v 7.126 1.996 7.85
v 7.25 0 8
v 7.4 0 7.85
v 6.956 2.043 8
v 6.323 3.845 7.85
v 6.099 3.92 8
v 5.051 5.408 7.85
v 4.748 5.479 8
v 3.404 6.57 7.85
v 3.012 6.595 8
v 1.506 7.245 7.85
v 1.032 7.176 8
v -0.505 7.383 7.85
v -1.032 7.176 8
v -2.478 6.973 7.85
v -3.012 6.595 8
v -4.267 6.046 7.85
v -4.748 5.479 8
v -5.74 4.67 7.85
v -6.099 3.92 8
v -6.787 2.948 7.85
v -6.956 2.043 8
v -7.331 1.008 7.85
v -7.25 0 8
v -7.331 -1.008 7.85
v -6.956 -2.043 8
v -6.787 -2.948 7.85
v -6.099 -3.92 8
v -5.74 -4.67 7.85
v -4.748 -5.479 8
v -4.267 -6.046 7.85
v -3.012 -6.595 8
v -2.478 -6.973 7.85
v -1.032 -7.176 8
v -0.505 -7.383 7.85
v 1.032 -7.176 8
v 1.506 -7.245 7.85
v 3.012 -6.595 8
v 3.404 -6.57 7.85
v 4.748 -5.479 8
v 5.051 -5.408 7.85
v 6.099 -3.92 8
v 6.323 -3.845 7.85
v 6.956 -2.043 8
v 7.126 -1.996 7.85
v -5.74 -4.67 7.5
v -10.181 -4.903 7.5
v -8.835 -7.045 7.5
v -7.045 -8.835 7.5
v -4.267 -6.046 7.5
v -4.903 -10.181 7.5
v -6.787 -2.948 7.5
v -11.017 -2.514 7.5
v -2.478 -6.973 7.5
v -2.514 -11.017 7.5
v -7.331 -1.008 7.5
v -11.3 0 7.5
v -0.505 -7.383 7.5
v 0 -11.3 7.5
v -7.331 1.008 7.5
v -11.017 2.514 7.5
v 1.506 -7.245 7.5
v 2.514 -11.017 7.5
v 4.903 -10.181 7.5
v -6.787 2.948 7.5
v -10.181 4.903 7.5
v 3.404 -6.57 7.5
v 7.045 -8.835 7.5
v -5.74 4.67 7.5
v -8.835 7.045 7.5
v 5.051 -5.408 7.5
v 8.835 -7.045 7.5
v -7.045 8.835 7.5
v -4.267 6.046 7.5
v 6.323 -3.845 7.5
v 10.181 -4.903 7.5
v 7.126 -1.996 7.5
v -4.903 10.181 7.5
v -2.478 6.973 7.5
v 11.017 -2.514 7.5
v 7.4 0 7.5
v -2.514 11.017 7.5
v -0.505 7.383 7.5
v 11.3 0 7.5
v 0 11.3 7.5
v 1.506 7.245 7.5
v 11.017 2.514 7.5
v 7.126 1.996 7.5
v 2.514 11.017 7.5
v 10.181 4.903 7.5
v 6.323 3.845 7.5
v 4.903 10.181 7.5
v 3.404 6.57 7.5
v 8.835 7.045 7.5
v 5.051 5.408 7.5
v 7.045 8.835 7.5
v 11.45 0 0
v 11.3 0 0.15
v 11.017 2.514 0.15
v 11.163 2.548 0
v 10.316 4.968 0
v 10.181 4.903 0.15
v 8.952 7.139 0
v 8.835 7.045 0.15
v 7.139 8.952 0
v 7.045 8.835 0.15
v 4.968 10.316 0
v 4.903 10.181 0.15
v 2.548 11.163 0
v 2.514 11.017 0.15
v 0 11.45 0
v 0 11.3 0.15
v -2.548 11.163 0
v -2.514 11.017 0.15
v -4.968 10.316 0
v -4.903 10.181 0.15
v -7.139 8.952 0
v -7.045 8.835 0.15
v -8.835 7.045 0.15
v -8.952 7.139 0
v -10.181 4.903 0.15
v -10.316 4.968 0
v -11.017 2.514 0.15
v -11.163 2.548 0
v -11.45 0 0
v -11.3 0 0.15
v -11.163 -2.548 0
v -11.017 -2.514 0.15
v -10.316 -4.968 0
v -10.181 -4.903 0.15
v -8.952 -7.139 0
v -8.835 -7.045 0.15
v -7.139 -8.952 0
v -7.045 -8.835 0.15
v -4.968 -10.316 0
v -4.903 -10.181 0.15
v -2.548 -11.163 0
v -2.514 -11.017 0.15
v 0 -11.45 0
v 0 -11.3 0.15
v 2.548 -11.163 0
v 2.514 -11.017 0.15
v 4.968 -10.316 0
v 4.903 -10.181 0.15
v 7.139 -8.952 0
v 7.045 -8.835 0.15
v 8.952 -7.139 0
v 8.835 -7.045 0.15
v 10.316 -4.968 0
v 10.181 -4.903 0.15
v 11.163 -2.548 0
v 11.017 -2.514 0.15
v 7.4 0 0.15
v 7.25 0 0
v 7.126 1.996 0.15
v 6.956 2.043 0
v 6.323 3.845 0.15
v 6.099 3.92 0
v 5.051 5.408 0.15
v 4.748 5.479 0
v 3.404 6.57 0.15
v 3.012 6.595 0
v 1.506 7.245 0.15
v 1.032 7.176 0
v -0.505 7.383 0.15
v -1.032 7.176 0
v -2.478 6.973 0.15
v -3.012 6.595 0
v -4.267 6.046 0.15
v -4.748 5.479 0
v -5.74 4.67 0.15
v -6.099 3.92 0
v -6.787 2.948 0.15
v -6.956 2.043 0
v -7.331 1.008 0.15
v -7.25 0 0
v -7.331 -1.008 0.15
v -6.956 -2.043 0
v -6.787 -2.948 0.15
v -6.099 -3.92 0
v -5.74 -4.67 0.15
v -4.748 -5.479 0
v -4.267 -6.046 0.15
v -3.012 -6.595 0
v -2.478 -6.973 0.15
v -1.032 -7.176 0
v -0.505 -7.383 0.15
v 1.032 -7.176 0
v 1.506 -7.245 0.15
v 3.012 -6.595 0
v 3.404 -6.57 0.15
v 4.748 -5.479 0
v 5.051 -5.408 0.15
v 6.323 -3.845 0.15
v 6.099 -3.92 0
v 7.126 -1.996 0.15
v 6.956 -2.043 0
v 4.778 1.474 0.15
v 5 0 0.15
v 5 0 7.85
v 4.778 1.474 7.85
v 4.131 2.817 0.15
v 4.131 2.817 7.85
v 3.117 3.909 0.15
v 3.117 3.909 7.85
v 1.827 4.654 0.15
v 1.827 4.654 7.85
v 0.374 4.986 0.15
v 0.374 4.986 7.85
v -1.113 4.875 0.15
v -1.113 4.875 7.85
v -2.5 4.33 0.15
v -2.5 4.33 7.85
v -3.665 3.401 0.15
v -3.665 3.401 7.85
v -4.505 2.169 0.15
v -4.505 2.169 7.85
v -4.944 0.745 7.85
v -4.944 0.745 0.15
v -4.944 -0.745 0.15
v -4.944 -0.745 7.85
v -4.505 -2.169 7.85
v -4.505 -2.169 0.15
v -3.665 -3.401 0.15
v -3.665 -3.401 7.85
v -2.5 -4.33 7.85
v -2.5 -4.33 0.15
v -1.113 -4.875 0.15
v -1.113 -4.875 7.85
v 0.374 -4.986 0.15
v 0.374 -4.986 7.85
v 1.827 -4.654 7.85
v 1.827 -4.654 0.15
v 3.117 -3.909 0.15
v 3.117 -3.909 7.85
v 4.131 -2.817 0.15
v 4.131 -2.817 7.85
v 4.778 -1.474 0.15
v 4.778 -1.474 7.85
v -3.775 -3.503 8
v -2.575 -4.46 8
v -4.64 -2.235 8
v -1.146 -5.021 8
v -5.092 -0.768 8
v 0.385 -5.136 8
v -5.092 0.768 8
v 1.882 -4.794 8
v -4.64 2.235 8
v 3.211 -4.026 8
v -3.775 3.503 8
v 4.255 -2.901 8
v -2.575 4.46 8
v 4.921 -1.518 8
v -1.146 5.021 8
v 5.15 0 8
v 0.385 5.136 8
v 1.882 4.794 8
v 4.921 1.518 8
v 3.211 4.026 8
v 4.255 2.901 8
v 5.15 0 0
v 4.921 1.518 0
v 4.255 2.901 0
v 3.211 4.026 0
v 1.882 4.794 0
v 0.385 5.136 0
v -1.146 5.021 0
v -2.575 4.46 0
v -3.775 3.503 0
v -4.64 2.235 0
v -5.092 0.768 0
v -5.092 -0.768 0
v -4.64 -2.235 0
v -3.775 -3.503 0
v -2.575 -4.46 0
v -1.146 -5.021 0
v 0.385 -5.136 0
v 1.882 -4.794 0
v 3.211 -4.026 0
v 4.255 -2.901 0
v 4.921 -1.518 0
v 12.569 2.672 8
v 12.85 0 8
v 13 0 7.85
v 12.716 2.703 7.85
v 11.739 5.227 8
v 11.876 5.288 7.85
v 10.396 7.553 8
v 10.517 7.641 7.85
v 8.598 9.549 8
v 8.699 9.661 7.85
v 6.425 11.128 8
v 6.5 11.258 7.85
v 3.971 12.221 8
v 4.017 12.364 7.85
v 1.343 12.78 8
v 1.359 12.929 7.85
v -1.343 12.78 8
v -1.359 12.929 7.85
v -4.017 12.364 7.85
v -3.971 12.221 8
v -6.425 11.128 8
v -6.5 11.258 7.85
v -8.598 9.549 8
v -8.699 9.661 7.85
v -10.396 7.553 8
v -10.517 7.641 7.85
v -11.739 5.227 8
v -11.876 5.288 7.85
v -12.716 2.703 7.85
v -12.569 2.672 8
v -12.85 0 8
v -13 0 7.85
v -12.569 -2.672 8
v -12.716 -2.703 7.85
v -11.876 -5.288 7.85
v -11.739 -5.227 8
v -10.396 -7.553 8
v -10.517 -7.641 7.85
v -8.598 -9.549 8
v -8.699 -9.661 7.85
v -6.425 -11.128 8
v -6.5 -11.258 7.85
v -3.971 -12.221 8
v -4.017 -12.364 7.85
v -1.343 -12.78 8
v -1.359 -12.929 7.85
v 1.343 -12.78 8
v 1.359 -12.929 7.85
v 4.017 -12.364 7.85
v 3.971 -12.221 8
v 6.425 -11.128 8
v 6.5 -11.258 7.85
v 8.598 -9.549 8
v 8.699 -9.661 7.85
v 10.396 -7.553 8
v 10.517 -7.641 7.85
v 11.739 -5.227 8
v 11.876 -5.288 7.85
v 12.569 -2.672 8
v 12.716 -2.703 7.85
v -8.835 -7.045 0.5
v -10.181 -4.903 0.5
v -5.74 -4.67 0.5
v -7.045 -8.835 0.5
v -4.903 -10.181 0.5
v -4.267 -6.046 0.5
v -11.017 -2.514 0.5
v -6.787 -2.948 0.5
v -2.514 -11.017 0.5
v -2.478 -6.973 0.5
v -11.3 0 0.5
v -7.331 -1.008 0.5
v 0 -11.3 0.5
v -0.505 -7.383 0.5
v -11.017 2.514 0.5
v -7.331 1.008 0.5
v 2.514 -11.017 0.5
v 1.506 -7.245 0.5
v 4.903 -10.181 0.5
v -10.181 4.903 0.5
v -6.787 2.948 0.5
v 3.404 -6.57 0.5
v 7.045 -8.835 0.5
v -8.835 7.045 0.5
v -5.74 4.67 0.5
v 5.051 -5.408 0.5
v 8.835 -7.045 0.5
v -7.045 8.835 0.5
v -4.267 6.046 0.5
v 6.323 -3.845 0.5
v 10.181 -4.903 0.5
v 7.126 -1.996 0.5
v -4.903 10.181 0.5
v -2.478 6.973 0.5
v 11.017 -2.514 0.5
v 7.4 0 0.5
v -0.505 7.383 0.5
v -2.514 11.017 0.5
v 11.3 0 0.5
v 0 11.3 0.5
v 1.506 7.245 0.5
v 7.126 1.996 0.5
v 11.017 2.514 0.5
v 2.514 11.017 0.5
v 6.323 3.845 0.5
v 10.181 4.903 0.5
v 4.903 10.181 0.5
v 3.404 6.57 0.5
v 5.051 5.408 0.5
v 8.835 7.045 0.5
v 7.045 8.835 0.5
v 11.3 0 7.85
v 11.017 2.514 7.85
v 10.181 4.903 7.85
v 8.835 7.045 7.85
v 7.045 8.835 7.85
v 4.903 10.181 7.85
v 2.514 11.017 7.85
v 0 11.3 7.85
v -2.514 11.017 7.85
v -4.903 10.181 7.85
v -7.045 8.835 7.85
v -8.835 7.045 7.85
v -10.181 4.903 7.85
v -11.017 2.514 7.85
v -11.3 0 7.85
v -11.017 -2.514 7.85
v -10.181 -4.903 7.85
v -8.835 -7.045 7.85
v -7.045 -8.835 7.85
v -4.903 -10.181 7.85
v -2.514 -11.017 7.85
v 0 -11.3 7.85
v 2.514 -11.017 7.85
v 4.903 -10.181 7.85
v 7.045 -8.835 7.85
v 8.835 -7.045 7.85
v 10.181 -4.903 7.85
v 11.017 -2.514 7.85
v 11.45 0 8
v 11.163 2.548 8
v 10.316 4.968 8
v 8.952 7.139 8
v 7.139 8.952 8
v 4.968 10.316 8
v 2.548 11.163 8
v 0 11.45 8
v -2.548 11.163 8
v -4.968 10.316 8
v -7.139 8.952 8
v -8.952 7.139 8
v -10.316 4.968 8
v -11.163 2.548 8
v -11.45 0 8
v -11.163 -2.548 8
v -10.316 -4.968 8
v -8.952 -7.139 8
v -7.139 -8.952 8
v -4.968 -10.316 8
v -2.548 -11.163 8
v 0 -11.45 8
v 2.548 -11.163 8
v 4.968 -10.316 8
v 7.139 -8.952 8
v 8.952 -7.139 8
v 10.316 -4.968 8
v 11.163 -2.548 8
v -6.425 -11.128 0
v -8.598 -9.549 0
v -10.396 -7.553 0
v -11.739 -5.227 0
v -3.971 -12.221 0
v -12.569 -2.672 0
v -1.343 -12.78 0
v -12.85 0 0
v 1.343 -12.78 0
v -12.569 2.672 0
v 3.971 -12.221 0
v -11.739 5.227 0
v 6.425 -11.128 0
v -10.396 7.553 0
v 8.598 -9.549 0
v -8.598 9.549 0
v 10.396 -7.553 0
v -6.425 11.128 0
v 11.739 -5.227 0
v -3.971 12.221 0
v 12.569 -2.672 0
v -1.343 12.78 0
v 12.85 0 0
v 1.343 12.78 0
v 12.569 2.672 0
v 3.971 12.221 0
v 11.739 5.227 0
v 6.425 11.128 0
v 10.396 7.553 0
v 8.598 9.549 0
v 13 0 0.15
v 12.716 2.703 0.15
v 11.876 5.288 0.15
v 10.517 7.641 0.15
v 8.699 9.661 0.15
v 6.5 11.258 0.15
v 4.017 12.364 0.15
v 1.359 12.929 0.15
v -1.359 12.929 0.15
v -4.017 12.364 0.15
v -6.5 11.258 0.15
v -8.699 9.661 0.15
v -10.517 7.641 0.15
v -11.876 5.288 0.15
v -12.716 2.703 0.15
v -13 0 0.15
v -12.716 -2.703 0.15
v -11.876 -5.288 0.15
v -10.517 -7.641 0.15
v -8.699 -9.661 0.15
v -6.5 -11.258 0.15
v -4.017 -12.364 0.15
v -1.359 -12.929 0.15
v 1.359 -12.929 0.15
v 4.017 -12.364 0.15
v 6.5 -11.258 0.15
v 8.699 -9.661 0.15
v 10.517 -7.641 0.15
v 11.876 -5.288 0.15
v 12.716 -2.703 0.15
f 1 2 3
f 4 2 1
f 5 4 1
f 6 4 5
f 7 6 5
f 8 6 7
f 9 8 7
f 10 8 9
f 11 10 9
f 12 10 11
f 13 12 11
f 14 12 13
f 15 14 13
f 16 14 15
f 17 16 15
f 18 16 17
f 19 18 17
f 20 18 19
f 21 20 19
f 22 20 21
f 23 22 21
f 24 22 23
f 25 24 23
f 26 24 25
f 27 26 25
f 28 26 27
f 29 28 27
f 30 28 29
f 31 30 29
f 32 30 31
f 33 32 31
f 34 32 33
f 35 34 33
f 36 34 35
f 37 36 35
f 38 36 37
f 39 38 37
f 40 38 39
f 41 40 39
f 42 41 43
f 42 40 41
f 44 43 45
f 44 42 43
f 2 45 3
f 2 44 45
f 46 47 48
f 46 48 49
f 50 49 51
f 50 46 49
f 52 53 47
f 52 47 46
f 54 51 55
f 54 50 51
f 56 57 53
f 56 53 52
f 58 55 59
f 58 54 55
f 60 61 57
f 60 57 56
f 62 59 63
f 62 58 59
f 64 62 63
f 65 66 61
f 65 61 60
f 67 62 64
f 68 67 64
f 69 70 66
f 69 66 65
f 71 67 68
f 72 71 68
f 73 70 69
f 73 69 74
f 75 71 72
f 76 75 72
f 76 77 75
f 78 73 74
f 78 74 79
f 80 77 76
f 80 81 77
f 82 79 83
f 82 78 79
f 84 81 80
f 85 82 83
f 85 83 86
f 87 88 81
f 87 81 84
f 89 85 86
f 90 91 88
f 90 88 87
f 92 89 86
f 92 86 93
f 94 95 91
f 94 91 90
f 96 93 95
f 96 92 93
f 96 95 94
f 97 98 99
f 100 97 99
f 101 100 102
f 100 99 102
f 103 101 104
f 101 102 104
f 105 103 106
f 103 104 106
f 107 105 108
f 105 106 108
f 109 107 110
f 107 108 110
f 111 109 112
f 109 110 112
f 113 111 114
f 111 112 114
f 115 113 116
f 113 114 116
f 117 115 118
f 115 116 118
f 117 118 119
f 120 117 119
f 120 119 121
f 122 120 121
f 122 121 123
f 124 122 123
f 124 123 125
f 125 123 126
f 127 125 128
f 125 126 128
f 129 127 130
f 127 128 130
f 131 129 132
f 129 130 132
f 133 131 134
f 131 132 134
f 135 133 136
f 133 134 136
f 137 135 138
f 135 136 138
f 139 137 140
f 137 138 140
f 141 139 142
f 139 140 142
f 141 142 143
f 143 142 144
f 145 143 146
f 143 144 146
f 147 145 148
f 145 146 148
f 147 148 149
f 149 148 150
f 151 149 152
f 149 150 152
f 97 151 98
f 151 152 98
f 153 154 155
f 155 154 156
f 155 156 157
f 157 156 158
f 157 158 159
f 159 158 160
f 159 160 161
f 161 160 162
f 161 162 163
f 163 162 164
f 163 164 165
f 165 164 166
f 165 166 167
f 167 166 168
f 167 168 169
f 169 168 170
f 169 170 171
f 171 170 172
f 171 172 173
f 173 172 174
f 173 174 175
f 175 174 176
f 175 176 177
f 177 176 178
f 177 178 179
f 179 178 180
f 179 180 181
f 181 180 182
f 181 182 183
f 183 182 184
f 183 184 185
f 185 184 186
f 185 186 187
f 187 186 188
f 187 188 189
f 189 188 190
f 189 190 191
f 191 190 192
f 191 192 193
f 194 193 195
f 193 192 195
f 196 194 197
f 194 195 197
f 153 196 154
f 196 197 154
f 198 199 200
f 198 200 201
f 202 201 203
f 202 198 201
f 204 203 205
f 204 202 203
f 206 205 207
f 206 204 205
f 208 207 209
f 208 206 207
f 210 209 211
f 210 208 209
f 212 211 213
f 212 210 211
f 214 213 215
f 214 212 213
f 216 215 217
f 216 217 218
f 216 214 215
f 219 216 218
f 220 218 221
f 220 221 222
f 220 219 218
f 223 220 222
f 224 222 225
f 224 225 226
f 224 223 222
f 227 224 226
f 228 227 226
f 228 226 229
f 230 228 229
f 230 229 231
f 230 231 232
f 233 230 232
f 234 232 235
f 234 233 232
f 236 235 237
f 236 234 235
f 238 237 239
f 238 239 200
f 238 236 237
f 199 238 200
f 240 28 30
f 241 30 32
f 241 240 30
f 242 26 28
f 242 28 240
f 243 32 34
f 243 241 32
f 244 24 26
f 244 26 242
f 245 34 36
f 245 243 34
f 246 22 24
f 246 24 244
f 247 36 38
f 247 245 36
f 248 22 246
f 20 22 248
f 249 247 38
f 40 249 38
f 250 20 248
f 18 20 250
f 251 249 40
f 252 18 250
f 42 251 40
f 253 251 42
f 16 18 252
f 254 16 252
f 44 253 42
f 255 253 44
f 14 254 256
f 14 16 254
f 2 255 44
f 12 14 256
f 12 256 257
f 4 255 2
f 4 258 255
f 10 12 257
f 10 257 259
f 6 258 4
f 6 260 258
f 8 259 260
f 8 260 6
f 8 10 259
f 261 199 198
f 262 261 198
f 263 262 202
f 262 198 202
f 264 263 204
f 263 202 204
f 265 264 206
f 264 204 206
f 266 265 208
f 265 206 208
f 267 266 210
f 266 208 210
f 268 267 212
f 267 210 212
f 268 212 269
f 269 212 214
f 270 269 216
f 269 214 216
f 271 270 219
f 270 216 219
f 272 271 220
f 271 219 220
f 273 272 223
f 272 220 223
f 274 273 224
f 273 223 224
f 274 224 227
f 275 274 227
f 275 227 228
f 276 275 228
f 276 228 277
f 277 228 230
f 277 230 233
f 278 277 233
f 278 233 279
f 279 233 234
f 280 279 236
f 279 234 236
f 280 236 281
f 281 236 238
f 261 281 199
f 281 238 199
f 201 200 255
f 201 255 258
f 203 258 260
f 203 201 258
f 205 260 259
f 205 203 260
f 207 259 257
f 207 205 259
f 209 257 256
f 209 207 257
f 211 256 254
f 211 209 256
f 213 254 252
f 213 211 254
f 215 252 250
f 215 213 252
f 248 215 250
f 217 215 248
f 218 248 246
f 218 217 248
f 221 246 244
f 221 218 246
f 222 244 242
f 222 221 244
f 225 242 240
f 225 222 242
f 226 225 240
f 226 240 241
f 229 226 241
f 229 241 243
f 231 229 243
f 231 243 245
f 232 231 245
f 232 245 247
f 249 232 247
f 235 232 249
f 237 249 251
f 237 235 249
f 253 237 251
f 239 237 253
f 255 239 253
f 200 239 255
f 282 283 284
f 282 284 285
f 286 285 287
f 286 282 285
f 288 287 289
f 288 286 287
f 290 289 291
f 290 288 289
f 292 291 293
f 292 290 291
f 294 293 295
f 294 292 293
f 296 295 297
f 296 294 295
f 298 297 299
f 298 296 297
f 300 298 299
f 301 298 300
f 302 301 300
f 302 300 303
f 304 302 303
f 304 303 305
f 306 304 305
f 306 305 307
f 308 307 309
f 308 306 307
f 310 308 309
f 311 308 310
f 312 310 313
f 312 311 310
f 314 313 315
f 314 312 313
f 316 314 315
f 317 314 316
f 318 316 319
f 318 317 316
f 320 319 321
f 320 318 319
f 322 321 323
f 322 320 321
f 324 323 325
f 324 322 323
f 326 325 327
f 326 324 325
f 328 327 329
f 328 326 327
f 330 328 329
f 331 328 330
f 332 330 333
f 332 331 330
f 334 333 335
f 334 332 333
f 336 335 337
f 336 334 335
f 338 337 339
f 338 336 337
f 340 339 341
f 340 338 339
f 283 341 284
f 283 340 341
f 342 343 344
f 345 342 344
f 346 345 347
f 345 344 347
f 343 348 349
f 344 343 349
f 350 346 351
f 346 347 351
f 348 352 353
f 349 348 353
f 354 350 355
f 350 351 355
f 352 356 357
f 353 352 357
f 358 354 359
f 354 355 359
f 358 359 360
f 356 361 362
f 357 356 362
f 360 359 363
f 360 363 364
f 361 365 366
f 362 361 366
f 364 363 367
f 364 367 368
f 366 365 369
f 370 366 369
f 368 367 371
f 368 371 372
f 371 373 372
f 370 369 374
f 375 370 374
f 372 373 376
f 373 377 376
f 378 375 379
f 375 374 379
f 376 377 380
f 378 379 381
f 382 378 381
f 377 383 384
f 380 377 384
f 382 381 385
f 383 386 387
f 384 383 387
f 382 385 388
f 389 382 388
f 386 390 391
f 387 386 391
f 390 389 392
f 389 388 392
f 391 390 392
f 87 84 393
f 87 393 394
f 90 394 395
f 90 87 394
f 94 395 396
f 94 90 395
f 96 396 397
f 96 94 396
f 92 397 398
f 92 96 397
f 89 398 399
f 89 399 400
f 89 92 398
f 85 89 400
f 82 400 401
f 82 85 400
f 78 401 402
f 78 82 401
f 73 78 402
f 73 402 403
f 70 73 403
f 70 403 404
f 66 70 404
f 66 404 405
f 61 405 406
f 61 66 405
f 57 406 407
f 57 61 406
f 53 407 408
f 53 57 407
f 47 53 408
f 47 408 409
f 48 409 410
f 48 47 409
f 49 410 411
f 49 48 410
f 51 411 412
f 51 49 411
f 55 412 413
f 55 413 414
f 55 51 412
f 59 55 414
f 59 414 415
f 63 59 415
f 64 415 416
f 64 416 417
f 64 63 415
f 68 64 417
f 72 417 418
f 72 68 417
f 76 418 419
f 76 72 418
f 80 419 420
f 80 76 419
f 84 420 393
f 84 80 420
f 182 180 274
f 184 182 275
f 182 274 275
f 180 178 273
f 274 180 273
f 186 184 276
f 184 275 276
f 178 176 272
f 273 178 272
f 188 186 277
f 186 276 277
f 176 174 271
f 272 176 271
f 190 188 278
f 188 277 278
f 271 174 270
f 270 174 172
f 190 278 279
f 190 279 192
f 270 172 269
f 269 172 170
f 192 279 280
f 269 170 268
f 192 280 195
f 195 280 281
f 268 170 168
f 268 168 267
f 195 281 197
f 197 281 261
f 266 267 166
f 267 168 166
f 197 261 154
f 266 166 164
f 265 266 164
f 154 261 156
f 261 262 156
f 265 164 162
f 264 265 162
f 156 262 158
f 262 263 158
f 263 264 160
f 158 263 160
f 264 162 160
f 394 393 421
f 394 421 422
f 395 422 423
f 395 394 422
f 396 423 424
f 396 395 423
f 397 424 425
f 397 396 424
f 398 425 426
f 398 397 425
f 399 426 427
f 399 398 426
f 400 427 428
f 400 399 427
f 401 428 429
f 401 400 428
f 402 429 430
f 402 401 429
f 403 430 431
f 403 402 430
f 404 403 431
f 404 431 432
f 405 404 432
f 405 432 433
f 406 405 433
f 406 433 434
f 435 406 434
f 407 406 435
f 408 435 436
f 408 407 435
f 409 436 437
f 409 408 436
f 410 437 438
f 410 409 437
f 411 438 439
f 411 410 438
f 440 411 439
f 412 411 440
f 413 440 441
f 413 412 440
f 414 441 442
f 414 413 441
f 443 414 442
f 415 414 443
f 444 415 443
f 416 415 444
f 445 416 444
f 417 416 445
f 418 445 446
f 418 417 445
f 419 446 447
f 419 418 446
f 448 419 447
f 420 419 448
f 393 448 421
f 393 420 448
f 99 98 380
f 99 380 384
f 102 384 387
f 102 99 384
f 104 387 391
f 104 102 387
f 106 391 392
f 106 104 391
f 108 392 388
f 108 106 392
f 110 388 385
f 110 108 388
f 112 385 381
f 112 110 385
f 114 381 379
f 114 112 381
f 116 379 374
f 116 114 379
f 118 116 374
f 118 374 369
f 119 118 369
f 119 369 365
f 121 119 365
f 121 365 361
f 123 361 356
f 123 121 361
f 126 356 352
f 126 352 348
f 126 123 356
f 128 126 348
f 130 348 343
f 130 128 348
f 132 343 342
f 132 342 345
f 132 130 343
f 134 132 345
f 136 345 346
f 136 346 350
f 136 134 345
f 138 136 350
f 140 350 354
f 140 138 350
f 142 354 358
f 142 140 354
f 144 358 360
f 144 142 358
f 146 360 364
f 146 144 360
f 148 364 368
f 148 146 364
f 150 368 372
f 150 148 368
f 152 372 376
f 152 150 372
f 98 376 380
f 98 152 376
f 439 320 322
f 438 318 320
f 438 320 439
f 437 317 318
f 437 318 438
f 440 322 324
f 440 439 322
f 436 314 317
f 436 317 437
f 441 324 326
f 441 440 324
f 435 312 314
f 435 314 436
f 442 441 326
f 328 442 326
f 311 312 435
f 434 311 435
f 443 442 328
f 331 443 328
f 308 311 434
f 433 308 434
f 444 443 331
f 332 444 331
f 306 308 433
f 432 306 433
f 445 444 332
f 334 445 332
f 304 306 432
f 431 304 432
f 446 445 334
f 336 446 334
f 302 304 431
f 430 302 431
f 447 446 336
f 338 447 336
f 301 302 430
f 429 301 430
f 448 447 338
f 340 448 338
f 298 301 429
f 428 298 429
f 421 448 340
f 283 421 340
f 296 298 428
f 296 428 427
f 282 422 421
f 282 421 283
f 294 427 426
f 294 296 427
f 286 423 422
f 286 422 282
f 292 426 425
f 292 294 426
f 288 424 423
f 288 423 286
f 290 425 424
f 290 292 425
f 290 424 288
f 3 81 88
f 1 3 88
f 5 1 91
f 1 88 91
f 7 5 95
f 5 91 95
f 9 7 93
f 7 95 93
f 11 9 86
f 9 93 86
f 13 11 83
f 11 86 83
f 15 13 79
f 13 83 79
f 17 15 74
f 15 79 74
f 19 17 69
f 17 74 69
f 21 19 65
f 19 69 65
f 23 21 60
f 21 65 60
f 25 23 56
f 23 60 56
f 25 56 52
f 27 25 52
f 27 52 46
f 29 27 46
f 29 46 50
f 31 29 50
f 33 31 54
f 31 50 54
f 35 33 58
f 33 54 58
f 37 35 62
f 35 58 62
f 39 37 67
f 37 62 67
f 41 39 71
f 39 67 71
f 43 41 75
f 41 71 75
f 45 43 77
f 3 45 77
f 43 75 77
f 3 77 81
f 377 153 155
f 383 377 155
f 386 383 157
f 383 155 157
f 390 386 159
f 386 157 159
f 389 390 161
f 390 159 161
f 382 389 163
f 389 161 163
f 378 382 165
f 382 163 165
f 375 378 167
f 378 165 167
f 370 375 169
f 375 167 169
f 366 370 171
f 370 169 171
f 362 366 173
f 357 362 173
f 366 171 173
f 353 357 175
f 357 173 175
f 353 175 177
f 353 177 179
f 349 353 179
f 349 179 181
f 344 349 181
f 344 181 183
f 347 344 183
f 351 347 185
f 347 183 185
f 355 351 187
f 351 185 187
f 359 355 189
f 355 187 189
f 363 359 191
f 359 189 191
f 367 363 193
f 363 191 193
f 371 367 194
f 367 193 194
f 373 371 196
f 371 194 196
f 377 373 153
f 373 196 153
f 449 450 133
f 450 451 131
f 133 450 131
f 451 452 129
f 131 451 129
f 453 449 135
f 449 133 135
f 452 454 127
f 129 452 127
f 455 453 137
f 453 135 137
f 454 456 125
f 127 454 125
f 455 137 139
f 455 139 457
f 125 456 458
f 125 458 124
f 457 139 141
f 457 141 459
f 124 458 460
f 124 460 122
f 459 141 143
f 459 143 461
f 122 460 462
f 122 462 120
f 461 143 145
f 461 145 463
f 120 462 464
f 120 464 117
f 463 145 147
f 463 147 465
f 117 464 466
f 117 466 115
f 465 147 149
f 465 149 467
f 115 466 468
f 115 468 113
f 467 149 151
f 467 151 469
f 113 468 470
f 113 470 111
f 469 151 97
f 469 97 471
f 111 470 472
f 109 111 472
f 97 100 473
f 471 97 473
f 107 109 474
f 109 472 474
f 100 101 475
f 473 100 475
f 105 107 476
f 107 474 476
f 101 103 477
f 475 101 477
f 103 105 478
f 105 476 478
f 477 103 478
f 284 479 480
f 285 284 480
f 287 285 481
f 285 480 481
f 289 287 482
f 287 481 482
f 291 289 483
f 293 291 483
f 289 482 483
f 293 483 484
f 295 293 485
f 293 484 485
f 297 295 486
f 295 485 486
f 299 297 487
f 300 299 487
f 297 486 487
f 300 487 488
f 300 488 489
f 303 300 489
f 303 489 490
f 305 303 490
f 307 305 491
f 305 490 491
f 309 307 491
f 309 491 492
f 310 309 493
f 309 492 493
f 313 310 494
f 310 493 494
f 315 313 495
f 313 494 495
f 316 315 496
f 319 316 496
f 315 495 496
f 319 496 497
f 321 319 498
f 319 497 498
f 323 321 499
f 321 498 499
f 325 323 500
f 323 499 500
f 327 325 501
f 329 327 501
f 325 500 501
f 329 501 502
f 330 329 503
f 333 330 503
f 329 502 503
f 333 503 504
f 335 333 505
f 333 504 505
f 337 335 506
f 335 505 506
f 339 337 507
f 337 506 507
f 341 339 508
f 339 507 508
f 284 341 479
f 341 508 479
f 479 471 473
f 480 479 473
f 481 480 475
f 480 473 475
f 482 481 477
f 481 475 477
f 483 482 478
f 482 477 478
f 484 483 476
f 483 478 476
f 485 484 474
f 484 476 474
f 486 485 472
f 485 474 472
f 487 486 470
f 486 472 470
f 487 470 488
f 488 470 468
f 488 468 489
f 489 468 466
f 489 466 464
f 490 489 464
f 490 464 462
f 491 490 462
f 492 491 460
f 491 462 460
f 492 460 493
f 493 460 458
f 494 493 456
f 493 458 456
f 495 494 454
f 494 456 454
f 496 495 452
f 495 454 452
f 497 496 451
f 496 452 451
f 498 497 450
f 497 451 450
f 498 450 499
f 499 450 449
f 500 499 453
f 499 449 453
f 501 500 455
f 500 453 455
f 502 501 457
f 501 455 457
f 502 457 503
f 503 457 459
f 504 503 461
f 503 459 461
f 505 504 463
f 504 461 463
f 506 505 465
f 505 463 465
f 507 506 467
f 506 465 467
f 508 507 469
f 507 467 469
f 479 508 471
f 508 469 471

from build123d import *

# Parameters (mm, degrees)
F0_R     = 13
F0_R_2   = 11.3
F0_R_3   = 7.4
F0_R_4   = 5
F1_DEPTH = 8
F2_DEPTH = 0.5
F3_START = 7.5
F3_DEPTH = 0.5
F4_SIZE  = 0.15


with BuildPart() as f1:
    # F0 (on Top) → F1 (new body)
    with BuildSketch(Plane.XY):
        Circle(F0_R)
        Circle(F0_R_2, mode=Mode.SUBTRACT)
        Circle(F0_R_2)
        Circle(F0_R_3, mode=Mode.SUBTRACT)
        Circle(F0_R_3)
        Circle(F0_R_4, mode=Mode.SUBTRACT)
    extrude(amount=F1_DEPTH)

    # F0 (on Top) → F2 (cut)
    with BuildSketch(Plane.XY):
        Circle(F0_R_2)
        Circle(F0_R_3, mode=Mode.SUBTRACT)
    extrude(amount=F2_DEPTH, mode=Mode.SUBTRACT)

    # F0 (on Top) → F3 (cut)
    with BuildSketch(Plane.XY.offset(F3_START)):
        Circle(F0_R_2)
        Circle(F0_R_3, mode=Mode.SUBTRACT)
    extrude(amount=F3_DEPTH, mode=Mode.SUBTRACT)

    # F4
    f4_edges = [f1.edges().sort_by_distance(p)[0] for p in [
        (-13, 0, 0),
        (-11.3, 0, 0),
        (-7.4, 0, 0),
        (-5, 0, 0),
        (-13, 0, 8),
        (-11.3, 0, 8),
        (-7.4, 0, 8),
        (-5, 0, 8),
    ]]
    chamfer(f4_edges, length=F4_SIZE)


solid = f1.part
